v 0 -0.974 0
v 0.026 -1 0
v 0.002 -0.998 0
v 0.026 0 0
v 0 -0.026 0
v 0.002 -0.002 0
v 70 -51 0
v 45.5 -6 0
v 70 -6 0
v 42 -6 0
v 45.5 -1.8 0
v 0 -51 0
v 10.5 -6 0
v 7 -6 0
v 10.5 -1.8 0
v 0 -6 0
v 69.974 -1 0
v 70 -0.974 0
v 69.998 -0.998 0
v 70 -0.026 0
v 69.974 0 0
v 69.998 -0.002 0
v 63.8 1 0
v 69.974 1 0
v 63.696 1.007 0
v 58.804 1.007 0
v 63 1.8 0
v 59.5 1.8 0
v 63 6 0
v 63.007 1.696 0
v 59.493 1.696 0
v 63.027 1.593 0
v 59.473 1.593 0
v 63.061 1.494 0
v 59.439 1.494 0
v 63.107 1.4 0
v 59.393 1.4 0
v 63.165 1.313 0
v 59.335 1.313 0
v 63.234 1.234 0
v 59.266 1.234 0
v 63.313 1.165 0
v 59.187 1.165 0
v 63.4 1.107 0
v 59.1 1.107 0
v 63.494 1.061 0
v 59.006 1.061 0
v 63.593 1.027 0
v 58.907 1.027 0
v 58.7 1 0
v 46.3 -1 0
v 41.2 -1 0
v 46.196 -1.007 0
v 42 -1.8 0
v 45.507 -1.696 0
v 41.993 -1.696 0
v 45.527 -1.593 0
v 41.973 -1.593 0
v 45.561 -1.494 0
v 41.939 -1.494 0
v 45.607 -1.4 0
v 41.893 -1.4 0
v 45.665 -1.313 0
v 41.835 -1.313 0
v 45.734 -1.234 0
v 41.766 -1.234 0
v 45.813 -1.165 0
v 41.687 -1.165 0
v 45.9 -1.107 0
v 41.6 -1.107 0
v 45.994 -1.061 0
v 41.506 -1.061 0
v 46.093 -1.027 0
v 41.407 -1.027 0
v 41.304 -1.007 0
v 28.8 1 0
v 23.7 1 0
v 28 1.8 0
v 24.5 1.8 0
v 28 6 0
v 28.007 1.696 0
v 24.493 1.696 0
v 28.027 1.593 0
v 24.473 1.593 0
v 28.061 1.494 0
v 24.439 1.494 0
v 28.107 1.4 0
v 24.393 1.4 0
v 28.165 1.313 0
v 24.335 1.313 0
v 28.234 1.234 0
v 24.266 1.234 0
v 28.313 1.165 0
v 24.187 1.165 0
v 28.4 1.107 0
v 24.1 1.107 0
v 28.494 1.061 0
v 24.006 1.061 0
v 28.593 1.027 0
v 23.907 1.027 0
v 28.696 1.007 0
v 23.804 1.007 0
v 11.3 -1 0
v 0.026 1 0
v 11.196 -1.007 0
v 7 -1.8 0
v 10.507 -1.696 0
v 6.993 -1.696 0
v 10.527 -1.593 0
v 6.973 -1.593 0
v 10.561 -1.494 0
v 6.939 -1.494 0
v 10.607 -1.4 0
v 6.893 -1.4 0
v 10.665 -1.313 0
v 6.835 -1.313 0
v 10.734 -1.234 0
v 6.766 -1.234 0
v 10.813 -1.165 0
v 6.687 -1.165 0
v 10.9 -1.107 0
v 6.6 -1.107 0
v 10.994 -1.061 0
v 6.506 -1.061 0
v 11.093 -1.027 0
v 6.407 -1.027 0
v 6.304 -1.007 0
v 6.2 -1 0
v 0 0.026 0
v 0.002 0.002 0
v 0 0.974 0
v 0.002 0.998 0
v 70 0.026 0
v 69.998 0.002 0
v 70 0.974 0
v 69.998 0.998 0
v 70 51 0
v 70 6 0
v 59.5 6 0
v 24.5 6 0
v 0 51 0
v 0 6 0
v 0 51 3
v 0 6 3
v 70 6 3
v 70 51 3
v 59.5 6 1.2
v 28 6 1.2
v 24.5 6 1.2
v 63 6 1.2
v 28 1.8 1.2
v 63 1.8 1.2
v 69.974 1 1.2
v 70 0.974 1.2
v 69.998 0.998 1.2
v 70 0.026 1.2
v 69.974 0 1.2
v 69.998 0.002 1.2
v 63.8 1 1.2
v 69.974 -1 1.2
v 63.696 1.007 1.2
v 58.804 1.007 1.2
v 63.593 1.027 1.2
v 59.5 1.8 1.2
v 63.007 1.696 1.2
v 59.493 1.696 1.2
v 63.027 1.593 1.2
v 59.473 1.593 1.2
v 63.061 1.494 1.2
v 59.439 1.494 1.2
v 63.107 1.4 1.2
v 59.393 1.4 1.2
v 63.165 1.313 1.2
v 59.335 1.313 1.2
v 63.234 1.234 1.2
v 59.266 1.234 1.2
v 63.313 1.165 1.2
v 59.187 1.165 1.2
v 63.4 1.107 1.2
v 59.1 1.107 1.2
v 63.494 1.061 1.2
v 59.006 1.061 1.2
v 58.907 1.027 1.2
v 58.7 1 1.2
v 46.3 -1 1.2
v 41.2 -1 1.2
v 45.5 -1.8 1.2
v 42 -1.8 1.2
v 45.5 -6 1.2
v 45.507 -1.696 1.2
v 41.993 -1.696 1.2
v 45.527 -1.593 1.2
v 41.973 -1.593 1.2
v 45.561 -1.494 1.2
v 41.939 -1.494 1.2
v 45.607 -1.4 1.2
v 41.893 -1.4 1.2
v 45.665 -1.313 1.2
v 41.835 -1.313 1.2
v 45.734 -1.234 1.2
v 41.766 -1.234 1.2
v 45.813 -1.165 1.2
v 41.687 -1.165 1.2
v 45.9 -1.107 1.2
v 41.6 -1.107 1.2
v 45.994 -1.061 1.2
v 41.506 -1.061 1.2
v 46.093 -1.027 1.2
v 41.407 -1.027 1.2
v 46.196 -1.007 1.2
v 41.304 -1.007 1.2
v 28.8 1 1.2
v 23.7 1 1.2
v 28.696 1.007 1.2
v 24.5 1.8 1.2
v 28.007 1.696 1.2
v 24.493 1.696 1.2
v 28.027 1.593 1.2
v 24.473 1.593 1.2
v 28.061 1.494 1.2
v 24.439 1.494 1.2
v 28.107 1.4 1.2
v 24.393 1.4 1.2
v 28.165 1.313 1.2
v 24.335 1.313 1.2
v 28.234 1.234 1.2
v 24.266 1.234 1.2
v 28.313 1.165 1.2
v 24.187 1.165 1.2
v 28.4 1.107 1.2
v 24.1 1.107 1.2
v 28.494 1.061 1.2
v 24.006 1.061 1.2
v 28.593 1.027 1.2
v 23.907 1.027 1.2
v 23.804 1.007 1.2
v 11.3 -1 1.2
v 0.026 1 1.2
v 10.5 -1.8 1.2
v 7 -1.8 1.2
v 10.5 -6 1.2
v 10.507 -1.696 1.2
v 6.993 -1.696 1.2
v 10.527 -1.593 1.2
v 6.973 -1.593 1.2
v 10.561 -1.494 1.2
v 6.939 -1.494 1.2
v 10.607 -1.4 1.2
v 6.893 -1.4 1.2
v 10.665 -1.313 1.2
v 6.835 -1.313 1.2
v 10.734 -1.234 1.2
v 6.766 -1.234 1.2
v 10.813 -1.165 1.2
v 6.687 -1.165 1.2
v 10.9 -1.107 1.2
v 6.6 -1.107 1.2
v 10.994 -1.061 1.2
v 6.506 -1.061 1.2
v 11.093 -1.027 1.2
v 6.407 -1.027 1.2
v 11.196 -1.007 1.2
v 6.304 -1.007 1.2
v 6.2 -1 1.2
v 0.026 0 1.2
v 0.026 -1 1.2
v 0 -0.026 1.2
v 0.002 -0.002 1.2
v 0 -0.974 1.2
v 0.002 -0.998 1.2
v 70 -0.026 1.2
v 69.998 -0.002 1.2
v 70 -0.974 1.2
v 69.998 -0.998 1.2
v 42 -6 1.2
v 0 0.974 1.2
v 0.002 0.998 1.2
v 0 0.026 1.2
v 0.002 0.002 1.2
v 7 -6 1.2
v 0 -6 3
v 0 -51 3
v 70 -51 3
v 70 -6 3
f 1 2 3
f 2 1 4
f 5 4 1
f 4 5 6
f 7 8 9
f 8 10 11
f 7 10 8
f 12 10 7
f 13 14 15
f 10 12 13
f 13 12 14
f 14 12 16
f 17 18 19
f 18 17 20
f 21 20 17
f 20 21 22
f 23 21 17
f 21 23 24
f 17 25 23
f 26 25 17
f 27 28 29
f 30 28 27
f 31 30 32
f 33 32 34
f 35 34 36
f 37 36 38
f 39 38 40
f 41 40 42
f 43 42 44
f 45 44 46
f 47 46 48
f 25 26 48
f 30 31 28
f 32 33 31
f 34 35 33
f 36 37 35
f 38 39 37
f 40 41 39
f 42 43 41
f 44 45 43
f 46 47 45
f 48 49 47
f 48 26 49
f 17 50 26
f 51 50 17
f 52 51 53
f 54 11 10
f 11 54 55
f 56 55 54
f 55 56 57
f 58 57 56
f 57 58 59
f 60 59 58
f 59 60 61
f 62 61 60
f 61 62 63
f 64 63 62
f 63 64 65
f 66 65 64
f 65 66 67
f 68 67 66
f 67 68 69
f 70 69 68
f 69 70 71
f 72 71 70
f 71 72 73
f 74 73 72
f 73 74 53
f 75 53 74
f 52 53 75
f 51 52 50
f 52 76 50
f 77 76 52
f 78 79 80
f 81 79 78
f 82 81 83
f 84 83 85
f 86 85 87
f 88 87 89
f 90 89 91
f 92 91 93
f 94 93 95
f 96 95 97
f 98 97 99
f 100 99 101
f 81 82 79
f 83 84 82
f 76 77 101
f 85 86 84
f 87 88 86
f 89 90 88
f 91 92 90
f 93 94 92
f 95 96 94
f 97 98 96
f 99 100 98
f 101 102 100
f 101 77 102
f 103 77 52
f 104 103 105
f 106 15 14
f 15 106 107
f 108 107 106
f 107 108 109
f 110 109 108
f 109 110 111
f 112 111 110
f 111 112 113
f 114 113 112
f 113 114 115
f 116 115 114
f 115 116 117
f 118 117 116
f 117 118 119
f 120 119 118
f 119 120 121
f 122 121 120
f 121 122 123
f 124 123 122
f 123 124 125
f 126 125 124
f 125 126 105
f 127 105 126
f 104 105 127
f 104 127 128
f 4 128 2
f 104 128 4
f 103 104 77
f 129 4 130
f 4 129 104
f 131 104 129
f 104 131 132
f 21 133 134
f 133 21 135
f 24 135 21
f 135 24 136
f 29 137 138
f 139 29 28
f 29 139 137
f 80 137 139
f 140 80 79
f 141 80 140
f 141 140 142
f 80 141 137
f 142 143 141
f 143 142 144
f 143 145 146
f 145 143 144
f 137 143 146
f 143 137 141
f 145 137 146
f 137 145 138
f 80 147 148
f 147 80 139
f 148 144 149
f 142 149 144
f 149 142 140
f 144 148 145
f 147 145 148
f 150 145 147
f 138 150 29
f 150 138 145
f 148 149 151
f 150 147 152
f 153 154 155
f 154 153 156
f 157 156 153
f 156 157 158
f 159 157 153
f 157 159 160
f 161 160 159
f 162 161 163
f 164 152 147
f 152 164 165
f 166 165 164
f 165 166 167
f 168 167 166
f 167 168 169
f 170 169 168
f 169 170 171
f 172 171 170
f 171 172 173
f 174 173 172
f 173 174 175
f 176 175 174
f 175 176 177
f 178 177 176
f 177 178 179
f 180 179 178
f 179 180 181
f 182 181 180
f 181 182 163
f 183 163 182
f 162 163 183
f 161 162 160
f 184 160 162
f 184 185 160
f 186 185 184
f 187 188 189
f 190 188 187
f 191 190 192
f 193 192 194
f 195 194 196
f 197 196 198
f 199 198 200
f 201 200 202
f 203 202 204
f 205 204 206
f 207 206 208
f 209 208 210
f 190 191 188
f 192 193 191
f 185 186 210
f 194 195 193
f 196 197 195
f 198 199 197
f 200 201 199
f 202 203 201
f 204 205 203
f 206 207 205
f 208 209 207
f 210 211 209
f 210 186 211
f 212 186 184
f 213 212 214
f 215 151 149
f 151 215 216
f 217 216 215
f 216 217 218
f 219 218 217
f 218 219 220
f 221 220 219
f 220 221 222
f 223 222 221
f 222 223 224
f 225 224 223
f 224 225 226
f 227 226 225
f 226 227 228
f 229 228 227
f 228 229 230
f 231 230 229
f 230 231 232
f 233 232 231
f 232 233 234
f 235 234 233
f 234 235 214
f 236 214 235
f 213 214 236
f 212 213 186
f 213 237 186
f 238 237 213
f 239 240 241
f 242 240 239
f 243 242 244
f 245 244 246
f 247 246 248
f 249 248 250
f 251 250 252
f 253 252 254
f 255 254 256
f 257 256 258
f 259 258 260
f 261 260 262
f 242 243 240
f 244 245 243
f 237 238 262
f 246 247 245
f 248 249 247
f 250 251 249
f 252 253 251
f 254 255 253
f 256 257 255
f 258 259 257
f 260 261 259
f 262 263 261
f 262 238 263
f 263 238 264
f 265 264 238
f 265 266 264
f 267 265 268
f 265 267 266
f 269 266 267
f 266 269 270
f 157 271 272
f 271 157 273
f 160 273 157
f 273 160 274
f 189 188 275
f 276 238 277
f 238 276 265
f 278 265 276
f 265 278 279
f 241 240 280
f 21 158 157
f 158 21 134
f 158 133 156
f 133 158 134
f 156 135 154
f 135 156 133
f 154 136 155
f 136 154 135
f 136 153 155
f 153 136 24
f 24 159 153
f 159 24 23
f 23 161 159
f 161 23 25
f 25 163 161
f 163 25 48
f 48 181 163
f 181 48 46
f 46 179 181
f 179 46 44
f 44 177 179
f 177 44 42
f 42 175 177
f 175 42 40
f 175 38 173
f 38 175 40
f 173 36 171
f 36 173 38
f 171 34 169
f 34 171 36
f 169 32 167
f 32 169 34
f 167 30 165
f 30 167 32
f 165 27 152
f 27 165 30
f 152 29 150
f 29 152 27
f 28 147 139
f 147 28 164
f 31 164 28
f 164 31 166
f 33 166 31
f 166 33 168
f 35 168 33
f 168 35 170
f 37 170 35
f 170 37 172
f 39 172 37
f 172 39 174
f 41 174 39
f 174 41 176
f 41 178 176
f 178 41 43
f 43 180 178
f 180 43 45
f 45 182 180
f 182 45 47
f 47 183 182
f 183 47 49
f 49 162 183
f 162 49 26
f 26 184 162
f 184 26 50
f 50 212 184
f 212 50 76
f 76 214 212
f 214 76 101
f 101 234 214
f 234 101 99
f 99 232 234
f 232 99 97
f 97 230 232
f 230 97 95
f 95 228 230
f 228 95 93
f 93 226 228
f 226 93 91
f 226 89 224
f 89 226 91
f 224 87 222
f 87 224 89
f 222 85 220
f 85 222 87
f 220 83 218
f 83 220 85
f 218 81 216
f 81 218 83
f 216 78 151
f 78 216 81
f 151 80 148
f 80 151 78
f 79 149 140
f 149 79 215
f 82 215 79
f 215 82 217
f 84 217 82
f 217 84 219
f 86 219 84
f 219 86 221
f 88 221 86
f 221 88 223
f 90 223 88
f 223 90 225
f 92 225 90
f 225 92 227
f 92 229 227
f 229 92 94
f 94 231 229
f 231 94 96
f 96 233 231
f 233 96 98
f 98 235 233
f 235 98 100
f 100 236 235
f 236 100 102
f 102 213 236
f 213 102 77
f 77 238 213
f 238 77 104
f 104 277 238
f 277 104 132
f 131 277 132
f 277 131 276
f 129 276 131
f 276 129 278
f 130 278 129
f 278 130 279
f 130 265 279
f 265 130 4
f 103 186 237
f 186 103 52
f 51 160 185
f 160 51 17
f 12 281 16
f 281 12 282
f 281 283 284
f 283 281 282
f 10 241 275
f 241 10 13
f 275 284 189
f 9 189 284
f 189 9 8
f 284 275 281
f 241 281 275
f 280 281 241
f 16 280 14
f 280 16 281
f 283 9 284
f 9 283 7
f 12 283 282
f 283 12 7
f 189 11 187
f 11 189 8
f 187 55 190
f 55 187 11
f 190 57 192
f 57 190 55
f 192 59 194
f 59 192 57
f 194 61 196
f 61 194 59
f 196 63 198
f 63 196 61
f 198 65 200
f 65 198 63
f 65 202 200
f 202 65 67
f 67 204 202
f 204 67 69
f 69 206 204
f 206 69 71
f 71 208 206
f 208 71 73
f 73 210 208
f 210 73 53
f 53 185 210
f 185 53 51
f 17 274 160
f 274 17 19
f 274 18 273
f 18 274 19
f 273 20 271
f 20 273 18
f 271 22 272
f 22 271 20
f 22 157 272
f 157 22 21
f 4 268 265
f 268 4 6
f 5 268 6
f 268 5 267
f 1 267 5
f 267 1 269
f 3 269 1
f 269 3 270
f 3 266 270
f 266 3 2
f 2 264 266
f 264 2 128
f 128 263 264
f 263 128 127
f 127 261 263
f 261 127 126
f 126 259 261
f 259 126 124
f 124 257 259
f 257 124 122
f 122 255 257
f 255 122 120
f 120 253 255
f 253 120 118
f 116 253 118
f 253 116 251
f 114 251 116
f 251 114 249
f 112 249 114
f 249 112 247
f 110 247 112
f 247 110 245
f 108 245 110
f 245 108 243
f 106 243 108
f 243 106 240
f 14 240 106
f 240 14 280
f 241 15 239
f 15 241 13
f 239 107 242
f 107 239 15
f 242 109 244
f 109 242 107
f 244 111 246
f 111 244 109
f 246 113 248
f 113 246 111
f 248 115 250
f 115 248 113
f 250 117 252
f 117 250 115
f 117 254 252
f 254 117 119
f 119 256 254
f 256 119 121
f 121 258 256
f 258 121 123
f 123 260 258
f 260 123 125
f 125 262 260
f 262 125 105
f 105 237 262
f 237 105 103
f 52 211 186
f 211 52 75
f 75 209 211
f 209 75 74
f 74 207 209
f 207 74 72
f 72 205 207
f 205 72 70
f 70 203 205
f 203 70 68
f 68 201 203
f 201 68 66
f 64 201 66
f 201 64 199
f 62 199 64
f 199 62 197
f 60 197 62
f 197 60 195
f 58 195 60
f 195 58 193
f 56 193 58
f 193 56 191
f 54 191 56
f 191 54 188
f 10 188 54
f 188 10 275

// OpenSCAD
// let-folding-panel — two panels joined by a Lamina-Emergent Torsional (LET)
// joint: a compliant hinge fabricated FLAT from a single sheet that folds up
// to ~90°. Reference design for docs/advanced-techniques.md Domain 1
// (compliant mechanisms), the lamina-emergent family — "the best FDM match"
// per the doc — and CC1 (orientation): it is flat by nature, so the flex is in
// the layer plane by construction.
//
// How a LET works, and how this models it. The fold line runs along X at y = 0.
// A thin TORSION BAR lies on that line, split half into each panel's group.
// Each panel reaches the bar only through a row of FINGERS, and the two rows
// are interdigitated — A-fingers at even pitches, B-fingers at odd. Fold the
// panels about X and adjacent fingers pull the bar in opposite Z directions, so
// each bar segment *between* two fingers TWISTS (torsion) — most of the
// compliance, which is what makes a LET high-ROM where a plain living hinge
// would crack. The parameterization below is the doc's: t (dominant, t^3),
// free span L, bar width w, root fillet r >= 0.5*t, target angle theta_max;
// main() echoes the predicted joint stiffness K and the root stress numbers.
//
// The hinge zone (bar + fingers) is printed THIN (t) while the panels stay at
// panel_t, so the compliance is concentrated in the joint, not the panels.
// Every finger root carries an in-plane fillet r (the doc's stress-rule),
// realised as a morphological closing on the hinge silhouette. Everything
// prints flat, no supports. All dimensions in millimeters.
//
// NOTE: `demo_fold` rotates panel B's group for the preview only. The PRINTED
// part is always flat (demo_fold = 0); a folded model is not a printable model.

/* [Panels] */
// Panel width along the fold line, X (mm)
hinge_w = 70;
// Each panel's depth away from the hinge, Y (mm)
panel_d = 45;
// Panel sheet thickness, Z (mm) — the rigid members; only the hinge zone is thin
panel_t = 3.0;

/* [LET joint — the doc's knobs] */
// Torsion-bar thickness, Z (mm) — THE dominant knob (stiffness ~ t^3). Floor
// 0.8 = repo minimum feature (2 extrusion widths at 0.4 nozzle).
t = 1.2;
// Free torsion span between adjacent finger attachments, X (mm) — longer bar
// twists at lower strain; with w this sets the fold-life trade.
L = 14;
// Torsion-bar width across the fold line, Y (mm)
w = 2.0;
// Root fillet at every finger↔bar junction (mm) — doc rule: r >= 0.5*t
r = 0.8;
// Target fold angle (deg) — what the echoed predictions are quoted at
theta_max = 90;
// Total interdigitated fingers (alternating A/B, so keep >= 3)
fingers = 4;
// Finger width along X (mm)
finger_w = 3.5;
// Finger run from panel edge across the fold line, Y (mm)
finger_reach = 6;

/* [Preview only] */
// Fold angle for the preview pose (deg). PRINT AT 0.
demo_fold = 0; // [0:5:110]

/* [Quality] */
$fn = 48;

// ---- derived -----------------------------------------------------------
// pitch is built FROM L so the free span is exactly the L you set (a realized
// dimension, not a nominal one); the bar spans fingers*pitch, flush with the
// panels at the defaults.
pitch     = finger_w + L;
strip_len = fingers * pitch;
g         = finger_reach;      // panel inner edges sit at y = ∓g
n_spans   = fingers - 1;       // torsion spans, all twisted by the fold angle

// morphological closing: rounds every concave (root) corner with radius r,
// leaves convex corners and the silhouette otherwise untouched.
module rooted_2d() {
    offset(r = -r) offset(r = r) children();
}

module panel_A_2d() {
    translate([0, -g - panel_d]) square([hinge_w, panel_d]);
}
module panel_B_2d() {
    translate([0, g]) square([hinge_w, panel_d]);
}

// A-side hinge silhouette: the near half of the torsion bar plus A's fingers
// (even slots), each embedded 1 mm into its panel for a robust union.
module hinge_A_2d() {
    rooted_2d() {
        translate([0, -w / 2]) square([strip_len, w / 2]);
        for (i = [0 : fingers - 1])
            if (i % 2 == 0) {
                x0 = i * pitch + (pitch - finger_w) / 2;
                translate([x0, -g - 1]) square([finger_w, g + 1 + w / 2]);
            }
    }
}
// B-side hinge silhouette: the far half of the bar plus B's fingers (odd
// slots), likewise embedded. Both halves carry their own root fillets, so the
// joint is symmetric in stress as well as in shape.
module hinge_B_2d() {
    rooted_2d() {
        translate([0, 0]) square([strip_len, w / 2]);
        for (i = [0 : fingers - 1])
            if (i % 2 == 1) {
                x0 = i * pitch + (pitch - finger_w) / 2;
                translate([x0, -w / 2]) square([finger_w, w / 2 + g + 1]);
            }
    }
}

// Predictions per the doc's governing relations — calibration starting points
// for the coupon, never a guarantee (that is what the coupon is for).
module echo_predictions() {
    E  = 2000;                  // PETG modulus, MPa (assumed — see NOTES.md)
    nu = 0.4;
    Gs = E / (2 * (1 + nu));    // shear modulus, MPa
    th = theta_max * PI / 180;  // rad
    // St-Venant torsion constant of the w × t rectangular bar, mm^4
    J  = w * t^3 / 3 * (1 - 0.63 * (t / w) + 0.052 * (t / w)^5);
    K_bar = Gs * J / L;               // N·mm/rad — one span
    K_tot = n_spans * K_bar;          // spans act in parallel across X
    L_bend = g - w / 2;               // finger-root bending length, mm
    sigma  = E * t * th / (2 * L_bend);  // doc: sigma ~ E·t·θ / (2L), MPa
    r_c = sqrt((w / 2)^2 + (t / 2)^2);   // corner fiber distance from the axis
    tau = Gs * th * r_c / L;            // torsion surface shear, MPa
    echo(str("LET predictions @ theta_max=", theta_max, "deg (E=", E,
             " MPa assumed): K_joint = ", K_tot, " N·mm/rad (", n_spans,
             " spans x ", K_bar, "), sigma_root = ", sigma,
             " MPa (doc upper bound if a root took the full fold), tau_bar = ",
             tau, " MPa (the design stress here — torsion dominates).",
             " Coupon arbitrates; these are starting points."));
}

module main() {
    assert(t >= 0.8, "torsion bar under the 0.8 mm minimum feature");
    assert(r >= 0.5 * t, "root fillet violates the doc rule r >= 0.5*t");
    assert(w >= 1.2, "torsion bar under 3 perimeters — it will tear");
    assert(L > 2 * r, "no free torsion span left after the root fillets");
    assert(fingers >= 3, "a LET needs at least 2 fingers on one side");
    assert(g > w / 2 + 2, "fingers too short to bridge the panels");
    echo_predictions();

    // fixed group: panel A and its half of the bar + A's fingers, all flat
    linear_extrude(panel_t) panel_A_2d();
    linear_extrude(t) hinge_A_2d();

    // moving group: panel B, its half-bar and its fingers, folded for preview
    rotate([demo_fold, 0, 0]) {
        linear_extrude(panel_t) panel_B_2d();
        linear_extrude(t) hinge_B_2d();
    }
}

main();
